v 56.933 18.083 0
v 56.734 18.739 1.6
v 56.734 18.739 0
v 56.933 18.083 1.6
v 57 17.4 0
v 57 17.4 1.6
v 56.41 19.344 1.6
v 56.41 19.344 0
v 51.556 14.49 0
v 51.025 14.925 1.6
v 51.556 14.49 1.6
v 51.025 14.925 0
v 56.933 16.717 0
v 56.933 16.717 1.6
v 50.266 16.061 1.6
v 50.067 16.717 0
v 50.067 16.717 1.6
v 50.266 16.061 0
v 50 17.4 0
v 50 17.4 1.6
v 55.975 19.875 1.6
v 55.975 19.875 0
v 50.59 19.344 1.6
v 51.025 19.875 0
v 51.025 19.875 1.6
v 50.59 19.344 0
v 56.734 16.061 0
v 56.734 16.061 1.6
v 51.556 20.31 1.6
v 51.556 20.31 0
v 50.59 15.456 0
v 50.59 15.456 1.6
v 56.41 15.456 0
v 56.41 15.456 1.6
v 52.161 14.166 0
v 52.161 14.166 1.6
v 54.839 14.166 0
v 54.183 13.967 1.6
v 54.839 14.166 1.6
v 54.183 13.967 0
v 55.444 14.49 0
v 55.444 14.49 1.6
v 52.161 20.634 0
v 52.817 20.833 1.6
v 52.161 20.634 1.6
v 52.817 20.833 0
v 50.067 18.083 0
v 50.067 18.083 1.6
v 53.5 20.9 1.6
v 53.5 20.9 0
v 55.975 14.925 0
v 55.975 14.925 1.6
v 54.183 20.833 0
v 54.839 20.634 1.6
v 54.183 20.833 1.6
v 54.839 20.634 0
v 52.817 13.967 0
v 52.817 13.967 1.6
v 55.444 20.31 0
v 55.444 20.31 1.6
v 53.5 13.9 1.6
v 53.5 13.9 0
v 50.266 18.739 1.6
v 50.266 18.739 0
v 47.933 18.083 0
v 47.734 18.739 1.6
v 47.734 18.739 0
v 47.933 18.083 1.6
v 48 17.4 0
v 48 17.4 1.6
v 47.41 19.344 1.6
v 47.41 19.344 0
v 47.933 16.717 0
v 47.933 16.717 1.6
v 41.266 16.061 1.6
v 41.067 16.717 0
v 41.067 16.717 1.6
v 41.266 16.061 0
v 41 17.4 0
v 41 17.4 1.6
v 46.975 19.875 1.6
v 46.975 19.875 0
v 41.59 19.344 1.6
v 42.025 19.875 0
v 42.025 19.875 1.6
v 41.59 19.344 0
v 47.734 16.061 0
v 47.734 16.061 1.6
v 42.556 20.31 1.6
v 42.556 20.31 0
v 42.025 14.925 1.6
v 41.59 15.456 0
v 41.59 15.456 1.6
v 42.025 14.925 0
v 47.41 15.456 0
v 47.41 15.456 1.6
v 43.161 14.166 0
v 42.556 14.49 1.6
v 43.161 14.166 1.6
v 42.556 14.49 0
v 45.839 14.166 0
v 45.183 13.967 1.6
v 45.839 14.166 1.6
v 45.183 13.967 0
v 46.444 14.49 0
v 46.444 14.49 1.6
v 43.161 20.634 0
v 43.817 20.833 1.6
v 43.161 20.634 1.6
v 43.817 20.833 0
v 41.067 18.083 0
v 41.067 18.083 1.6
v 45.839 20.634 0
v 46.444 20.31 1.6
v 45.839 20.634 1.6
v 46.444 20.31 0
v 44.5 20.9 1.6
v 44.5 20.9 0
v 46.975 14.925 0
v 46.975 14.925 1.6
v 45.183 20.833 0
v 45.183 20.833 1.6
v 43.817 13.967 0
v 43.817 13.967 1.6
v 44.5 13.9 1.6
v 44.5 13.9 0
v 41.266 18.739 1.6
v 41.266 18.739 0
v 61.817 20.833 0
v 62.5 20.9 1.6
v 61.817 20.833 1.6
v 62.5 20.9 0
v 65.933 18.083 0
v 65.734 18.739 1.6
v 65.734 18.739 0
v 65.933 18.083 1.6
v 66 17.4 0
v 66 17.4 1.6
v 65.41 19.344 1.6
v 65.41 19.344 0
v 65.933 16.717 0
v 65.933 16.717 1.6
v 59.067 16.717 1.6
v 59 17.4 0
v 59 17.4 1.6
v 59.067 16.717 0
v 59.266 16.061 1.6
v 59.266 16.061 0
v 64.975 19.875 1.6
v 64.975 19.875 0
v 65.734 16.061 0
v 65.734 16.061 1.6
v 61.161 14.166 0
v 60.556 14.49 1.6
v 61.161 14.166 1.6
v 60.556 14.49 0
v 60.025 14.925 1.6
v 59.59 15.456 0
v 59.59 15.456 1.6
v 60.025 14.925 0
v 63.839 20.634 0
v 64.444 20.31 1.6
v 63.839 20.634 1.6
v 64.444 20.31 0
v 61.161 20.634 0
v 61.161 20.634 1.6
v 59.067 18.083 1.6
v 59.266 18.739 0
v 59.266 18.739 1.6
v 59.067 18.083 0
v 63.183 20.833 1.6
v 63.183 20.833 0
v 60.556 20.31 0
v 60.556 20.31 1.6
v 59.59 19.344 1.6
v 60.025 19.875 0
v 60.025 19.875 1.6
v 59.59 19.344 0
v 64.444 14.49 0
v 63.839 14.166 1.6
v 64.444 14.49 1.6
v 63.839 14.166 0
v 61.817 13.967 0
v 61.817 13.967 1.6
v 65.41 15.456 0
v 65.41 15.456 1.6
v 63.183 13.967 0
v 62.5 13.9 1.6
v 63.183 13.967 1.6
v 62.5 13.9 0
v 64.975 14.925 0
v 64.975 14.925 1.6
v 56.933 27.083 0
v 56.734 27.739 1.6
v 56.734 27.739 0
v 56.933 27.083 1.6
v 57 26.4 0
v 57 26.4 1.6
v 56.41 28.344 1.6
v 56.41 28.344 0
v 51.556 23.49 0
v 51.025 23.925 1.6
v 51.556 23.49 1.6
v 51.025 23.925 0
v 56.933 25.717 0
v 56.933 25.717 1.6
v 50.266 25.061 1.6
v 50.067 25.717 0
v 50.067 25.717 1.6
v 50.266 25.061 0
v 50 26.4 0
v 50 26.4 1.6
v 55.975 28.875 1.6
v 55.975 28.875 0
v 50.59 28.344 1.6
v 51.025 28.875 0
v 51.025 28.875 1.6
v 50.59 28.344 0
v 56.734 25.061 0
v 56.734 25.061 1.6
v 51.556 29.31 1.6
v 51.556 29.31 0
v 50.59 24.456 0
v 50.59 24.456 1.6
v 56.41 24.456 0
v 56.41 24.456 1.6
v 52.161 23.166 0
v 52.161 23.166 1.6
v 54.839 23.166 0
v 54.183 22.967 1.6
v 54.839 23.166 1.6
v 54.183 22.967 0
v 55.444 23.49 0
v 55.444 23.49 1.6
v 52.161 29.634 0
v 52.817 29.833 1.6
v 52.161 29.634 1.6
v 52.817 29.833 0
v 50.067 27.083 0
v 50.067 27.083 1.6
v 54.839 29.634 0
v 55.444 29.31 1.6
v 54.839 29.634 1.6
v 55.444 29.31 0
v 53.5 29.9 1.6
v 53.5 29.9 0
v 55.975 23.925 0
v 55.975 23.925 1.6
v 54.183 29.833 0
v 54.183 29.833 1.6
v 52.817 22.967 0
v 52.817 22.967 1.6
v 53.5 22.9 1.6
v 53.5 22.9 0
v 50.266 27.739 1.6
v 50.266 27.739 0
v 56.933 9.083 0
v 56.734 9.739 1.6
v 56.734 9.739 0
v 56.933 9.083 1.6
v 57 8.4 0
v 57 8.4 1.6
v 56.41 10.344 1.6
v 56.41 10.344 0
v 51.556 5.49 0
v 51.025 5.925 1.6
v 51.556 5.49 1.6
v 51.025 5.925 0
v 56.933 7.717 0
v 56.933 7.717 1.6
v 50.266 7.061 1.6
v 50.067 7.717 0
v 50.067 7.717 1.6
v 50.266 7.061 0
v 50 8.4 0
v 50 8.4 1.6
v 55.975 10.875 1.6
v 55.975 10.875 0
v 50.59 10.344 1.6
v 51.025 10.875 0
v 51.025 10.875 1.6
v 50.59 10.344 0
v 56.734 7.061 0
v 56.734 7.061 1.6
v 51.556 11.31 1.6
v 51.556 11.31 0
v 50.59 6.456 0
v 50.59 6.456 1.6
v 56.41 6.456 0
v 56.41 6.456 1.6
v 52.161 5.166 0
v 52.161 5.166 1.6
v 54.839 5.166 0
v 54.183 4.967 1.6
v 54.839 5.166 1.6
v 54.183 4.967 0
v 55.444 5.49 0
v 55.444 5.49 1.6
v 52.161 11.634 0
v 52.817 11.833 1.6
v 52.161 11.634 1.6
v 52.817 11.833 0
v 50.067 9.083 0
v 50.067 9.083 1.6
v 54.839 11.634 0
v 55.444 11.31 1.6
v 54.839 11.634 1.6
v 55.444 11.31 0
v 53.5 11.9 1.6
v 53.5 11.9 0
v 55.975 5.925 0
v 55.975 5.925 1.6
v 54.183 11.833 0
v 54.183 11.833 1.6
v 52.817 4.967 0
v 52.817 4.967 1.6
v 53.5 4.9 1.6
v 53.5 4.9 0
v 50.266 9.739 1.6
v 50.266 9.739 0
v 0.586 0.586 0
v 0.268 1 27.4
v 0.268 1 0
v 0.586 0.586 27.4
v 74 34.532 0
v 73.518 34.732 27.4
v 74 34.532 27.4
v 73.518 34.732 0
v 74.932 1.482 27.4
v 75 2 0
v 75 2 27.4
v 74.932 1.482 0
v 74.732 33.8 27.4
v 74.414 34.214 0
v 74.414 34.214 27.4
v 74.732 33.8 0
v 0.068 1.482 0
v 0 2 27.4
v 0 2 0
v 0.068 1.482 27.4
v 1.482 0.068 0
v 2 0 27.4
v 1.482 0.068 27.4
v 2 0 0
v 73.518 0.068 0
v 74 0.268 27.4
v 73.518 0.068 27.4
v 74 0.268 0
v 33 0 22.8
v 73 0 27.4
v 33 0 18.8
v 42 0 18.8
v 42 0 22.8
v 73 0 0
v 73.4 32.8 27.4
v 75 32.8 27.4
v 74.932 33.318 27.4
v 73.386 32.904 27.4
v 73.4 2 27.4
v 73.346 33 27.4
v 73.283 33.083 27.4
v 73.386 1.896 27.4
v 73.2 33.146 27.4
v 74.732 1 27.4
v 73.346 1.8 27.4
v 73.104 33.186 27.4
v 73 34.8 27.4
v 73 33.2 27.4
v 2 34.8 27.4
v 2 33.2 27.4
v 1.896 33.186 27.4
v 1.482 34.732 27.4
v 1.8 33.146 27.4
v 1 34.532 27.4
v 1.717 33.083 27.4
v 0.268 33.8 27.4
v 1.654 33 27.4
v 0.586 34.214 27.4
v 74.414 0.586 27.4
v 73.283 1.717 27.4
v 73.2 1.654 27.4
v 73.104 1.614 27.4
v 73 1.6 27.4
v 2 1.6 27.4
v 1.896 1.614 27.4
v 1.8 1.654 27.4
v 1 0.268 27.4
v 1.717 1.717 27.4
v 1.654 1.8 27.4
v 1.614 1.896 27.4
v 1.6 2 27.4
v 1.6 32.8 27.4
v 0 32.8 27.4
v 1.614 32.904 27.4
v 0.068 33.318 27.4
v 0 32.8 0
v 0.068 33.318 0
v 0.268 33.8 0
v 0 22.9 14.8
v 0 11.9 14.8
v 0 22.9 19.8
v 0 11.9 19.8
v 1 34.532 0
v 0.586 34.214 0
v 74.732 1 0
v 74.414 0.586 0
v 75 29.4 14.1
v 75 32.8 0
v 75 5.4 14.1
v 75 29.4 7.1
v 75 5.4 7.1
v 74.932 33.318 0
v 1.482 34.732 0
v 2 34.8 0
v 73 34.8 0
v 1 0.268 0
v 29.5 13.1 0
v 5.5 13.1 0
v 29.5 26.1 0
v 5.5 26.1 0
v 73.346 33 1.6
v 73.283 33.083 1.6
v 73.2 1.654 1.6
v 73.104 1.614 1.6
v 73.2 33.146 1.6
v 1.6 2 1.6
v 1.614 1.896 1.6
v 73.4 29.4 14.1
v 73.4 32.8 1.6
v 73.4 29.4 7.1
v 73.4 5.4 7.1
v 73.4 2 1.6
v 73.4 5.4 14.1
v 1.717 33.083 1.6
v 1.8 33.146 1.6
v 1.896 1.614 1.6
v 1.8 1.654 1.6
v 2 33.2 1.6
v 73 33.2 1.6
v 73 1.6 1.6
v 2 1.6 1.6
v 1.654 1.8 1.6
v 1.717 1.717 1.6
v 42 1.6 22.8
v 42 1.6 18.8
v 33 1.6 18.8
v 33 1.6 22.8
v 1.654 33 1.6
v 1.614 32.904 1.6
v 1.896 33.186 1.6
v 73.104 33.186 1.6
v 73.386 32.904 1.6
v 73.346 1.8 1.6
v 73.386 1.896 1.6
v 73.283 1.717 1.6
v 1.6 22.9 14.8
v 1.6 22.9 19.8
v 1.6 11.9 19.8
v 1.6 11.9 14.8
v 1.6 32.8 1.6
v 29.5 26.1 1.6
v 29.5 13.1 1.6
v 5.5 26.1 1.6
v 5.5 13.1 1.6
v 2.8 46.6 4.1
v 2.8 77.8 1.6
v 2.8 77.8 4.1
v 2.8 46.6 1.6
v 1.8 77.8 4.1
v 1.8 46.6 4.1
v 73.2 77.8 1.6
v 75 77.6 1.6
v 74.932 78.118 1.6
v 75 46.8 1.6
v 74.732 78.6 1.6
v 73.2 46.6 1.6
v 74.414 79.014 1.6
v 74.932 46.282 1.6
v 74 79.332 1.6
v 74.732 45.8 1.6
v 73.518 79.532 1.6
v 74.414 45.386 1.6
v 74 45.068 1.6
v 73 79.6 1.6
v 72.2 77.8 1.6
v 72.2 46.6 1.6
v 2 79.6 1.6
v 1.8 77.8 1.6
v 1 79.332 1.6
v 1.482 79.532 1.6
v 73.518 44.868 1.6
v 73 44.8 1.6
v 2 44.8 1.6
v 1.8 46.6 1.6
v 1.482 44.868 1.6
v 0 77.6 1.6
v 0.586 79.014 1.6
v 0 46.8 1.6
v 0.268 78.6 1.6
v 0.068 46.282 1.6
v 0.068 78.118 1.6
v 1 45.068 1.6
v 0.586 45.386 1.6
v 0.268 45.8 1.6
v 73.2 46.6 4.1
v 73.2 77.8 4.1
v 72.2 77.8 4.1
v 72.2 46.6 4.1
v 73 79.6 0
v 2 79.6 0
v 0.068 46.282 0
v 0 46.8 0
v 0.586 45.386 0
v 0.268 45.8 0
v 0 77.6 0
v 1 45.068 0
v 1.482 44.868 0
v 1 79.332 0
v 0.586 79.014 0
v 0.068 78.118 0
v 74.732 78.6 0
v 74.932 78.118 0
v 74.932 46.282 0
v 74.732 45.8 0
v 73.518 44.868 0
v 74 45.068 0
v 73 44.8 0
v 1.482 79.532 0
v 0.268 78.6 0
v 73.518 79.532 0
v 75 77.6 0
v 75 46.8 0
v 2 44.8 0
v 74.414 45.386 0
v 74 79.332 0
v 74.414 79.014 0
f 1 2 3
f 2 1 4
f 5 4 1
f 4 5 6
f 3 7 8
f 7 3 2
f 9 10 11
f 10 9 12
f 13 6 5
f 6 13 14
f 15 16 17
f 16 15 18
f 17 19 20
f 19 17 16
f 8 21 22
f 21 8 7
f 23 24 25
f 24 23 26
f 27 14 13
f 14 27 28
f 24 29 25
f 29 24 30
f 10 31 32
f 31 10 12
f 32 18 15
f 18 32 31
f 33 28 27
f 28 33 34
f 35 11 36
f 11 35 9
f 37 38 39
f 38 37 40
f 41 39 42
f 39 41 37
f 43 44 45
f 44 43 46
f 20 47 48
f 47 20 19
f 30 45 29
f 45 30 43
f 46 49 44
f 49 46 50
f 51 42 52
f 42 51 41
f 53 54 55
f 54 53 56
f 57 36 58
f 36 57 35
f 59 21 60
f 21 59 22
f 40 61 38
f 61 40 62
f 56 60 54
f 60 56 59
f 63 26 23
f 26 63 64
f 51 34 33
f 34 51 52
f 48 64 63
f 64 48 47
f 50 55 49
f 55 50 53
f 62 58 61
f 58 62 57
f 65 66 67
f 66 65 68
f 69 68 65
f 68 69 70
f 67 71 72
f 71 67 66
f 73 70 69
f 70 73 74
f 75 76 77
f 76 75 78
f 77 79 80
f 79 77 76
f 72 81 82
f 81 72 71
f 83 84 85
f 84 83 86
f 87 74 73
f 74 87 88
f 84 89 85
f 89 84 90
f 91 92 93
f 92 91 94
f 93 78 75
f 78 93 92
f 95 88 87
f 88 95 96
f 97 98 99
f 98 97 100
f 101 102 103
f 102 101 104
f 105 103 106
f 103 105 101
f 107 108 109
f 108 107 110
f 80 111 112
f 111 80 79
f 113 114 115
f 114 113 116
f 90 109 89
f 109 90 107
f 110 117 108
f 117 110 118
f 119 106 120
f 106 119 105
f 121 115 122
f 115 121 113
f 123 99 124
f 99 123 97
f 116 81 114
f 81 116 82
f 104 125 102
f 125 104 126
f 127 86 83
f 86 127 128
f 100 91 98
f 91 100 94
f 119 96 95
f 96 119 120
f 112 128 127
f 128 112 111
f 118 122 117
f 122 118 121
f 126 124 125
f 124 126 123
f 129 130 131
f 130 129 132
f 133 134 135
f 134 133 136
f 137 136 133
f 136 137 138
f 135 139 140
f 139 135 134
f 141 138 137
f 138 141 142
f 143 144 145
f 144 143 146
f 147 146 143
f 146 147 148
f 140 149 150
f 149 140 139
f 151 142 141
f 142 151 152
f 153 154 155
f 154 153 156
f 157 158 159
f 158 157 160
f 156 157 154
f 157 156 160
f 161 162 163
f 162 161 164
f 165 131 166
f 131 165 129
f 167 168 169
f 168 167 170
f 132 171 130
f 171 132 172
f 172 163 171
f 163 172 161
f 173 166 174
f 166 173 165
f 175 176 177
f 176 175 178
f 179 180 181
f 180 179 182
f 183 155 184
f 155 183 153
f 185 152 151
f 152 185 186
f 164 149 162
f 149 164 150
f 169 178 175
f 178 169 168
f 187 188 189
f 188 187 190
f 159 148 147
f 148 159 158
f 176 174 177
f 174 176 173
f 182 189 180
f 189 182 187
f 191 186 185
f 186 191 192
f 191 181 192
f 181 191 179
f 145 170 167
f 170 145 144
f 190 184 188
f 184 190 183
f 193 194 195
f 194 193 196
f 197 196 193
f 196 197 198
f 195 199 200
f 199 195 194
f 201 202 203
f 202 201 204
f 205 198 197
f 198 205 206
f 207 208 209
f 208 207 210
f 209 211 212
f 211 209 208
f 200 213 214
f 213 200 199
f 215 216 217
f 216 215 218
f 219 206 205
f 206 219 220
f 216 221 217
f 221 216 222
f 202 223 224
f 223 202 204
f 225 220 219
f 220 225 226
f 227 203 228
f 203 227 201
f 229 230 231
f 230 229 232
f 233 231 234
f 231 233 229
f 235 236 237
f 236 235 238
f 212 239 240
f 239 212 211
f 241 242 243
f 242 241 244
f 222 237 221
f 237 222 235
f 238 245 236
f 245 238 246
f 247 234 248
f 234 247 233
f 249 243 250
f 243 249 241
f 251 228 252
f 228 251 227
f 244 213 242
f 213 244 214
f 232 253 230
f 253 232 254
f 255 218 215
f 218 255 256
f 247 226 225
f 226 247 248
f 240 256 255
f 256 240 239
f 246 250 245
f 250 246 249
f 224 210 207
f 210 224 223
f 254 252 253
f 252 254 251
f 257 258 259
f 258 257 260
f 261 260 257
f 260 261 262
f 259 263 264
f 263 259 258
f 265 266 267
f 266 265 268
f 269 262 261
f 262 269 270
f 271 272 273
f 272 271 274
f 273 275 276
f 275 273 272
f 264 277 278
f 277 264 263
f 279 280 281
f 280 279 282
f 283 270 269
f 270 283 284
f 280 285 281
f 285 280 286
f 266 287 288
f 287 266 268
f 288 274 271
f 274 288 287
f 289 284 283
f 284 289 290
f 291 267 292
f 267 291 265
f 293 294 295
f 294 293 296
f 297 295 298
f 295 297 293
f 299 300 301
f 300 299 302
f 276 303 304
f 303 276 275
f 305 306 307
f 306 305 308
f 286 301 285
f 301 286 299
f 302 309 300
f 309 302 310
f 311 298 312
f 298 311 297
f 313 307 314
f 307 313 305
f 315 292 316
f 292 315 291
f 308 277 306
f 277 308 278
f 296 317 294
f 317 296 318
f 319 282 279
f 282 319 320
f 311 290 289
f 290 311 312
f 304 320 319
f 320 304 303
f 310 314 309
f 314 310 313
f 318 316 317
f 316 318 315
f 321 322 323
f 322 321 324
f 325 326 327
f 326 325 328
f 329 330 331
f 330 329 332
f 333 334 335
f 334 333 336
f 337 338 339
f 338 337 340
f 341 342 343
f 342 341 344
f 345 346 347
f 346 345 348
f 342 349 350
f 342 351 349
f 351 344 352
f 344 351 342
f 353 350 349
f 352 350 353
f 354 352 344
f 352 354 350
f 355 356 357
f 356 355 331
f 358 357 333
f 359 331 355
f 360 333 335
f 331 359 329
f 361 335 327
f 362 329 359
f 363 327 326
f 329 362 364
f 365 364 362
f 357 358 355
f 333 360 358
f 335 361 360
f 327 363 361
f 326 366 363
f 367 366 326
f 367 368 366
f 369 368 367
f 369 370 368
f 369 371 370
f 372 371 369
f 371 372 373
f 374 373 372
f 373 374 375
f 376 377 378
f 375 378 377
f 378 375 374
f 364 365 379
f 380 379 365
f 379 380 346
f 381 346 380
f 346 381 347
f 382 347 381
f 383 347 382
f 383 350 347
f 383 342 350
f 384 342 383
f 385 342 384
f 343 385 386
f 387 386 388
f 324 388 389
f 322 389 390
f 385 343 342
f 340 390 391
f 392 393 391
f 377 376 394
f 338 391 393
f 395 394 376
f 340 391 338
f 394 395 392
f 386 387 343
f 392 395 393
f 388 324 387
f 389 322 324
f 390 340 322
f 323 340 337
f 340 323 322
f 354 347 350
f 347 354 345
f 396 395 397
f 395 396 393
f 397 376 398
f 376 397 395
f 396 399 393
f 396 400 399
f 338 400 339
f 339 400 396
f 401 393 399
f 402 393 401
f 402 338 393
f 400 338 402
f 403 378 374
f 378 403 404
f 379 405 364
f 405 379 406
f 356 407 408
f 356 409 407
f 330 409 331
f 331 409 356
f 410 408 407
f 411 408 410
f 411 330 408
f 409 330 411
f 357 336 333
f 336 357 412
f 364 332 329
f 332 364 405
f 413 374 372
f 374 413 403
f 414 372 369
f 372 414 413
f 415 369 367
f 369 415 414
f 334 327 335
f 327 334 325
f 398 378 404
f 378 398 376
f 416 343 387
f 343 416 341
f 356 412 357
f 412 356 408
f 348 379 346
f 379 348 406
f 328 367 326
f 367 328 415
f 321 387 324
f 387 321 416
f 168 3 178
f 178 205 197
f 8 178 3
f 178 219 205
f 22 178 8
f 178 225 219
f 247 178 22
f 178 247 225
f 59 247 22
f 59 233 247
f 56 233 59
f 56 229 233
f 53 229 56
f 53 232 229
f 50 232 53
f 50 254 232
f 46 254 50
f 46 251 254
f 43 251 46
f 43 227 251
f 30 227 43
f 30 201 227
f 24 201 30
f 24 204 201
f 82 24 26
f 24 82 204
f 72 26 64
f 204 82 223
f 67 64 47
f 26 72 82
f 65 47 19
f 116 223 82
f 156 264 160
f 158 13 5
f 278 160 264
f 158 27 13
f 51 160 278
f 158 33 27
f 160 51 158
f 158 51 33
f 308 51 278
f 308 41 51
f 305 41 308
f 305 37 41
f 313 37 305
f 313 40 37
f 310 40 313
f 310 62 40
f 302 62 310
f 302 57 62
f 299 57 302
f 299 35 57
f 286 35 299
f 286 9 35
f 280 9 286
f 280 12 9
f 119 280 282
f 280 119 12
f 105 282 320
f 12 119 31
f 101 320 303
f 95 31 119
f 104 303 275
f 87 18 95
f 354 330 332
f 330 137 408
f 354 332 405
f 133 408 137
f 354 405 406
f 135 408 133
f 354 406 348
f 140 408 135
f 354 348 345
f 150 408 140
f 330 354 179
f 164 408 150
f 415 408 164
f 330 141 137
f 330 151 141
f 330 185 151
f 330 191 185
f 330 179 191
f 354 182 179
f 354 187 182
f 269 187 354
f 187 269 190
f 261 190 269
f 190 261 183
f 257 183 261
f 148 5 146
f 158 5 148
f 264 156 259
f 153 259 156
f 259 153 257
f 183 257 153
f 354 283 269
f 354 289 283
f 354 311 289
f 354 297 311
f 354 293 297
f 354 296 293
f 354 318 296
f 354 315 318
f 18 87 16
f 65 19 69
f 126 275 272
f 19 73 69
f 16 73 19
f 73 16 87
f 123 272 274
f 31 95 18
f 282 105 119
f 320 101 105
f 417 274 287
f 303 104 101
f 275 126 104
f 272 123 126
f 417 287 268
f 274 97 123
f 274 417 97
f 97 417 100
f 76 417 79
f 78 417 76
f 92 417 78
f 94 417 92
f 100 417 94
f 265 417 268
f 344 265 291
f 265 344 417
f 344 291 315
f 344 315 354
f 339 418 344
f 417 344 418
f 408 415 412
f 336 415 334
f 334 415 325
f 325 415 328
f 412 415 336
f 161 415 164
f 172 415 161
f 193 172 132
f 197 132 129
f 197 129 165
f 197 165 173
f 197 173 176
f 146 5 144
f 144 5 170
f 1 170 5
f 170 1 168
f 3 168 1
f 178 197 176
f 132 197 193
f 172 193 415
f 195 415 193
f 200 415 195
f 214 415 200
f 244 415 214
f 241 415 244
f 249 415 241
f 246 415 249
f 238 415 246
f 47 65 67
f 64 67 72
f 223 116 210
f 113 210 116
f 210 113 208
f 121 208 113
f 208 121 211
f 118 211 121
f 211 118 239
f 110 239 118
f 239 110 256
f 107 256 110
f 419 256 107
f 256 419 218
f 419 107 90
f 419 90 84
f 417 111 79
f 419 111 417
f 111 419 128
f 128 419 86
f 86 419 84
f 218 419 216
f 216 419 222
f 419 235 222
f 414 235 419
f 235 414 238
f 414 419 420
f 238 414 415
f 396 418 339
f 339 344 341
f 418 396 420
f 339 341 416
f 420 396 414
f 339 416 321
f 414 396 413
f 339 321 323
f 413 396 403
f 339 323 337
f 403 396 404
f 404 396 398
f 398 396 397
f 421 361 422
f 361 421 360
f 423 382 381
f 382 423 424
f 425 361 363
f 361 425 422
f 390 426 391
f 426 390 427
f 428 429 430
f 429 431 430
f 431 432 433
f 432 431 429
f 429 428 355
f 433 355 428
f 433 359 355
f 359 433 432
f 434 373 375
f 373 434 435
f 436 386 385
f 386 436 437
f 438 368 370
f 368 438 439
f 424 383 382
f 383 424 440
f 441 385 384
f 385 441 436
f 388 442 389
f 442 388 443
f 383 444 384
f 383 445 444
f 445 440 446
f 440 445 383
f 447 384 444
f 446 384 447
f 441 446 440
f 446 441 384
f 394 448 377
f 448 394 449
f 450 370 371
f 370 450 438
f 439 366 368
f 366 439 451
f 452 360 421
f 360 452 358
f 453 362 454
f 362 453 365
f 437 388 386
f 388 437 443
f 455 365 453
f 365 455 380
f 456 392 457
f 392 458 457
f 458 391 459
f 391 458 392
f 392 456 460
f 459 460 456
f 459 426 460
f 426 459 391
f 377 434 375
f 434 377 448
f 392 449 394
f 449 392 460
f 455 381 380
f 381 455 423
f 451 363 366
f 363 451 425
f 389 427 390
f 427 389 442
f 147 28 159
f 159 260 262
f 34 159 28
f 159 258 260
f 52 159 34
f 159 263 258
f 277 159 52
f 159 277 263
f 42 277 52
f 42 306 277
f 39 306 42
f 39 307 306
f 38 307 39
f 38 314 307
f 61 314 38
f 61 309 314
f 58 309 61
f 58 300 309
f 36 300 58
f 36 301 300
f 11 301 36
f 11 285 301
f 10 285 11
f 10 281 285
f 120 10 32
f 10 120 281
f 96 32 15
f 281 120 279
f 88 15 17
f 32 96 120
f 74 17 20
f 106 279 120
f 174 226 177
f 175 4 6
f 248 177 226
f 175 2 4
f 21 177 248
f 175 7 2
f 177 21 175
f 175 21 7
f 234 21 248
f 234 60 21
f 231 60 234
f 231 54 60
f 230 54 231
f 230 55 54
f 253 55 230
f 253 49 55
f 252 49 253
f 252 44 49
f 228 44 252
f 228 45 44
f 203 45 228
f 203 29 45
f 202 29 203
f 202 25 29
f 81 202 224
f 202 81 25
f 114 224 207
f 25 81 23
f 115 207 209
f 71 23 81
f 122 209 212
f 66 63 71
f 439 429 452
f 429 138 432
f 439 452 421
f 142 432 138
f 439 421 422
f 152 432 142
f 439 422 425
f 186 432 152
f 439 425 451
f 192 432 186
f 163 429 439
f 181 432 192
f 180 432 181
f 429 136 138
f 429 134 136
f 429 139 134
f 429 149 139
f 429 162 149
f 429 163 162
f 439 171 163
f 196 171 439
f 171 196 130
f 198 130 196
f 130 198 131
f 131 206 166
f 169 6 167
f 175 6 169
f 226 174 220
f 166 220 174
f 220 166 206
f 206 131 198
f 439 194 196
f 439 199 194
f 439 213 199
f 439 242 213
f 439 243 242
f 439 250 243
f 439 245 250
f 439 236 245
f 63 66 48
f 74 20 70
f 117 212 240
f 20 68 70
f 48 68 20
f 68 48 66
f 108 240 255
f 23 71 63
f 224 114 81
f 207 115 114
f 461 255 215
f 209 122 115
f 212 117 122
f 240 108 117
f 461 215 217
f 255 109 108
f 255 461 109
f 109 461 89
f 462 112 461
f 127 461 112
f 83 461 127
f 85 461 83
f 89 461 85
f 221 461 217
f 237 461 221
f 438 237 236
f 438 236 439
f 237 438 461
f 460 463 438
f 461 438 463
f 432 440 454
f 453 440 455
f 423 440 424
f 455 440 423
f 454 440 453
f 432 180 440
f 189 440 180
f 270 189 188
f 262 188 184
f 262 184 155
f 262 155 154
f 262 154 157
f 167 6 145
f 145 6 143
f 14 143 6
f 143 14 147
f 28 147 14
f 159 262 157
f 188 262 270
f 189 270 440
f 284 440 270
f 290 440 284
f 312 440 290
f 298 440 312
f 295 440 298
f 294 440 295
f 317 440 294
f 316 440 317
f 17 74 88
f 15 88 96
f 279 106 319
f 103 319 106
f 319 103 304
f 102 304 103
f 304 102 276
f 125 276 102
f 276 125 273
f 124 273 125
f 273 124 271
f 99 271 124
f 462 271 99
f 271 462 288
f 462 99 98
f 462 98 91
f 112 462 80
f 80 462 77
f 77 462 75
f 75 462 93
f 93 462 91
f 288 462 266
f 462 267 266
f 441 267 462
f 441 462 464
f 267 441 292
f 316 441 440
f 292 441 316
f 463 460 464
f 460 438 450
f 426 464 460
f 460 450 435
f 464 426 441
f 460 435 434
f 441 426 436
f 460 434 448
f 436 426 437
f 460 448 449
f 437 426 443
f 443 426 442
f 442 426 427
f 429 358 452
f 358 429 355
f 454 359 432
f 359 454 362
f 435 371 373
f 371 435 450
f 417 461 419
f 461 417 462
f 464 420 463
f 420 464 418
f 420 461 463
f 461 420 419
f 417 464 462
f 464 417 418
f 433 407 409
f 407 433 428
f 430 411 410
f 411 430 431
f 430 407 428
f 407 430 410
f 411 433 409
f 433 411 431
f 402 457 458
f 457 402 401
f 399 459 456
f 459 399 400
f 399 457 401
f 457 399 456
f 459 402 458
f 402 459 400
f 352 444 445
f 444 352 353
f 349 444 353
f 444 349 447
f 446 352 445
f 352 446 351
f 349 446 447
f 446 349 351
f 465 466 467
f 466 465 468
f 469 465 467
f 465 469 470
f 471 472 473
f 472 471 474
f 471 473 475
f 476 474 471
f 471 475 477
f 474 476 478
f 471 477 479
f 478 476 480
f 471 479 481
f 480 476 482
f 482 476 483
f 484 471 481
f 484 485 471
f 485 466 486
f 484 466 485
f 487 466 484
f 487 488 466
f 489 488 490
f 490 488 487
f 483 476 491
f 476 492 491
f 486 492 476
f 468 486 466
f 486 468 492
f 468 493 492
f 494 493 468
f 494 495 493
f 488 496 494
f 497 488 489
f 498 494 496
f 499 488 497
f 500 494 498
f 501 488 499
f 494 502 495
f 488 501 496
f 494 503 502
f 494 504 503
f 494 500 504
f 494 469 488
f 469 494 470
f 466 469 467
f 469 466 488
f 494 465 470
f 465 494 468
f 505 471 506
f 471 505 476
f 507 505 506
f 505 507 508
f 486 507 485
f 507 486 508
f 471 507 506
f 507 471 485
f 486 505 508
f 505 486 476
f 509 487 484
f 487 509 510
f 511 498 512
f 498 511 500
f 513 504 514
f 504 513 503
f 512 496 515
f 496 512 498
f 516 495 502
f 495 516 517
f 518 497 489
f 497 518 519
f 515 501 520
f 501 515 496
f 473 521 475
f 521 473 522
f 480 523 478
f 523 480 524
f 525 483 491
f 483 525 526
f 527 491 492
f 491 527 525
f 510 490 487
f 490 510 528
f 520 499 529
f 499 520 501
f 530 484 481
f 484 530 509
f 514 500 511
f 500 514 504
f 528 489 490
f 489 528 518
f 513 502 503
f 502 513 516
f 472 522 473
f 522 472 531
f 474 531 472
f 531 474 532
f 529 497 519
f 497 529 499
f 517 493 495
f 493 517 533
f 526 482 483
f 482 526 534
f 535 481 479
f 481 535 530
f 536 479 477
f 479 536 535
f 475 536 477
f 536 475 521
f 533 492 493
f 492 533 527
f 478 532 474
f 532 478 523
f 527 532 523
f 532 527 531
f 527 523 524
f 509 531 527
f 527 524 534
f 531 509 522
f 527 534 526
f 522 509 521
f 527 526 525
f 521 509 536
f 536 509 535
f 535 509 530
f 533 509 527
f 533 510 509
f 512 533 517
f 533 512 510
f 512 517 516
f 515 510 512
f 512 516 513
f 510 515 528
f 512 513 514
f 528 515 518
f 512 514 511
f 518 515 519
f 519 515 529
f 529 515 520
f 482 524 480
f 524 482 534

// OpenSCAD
// =====================================================================
//  POCKET AI CASE (parametrik) - untuk 3D print
//  Buka di OpenSCAD (gratis), ubah angka di bawah sesuai komponenmu,
//  tekan F6 (Render), lalu File > Export > Export as STL.
//
//  Susunan dari depan ke belakang:
//    [pelat depan: jendela OLED + 5 tombol]
//    [lapisan OLED]
//    [lapisan ESP32-S3]
//    [lapisan belakang: charger (kiri), baterai (kanan),
//     boost MT3608 ditumpuk di atas baterai]
//    [tutup belakang, tekan masuk]
//
//  Cetak: body dengan sisi depan di bawah, lid dengan pelat di bawah.
//  Layar menghadap depan di sisi z = 0.
// =====================================================================

part = "both";   // "body", "lid", atau "both" (both = untuk pratinjau)

// ---------- UKURAN KOMPONEN (mm) - UKUR PUNYAMU ----------
esp_l  = 69;     // panjang board ESP32-S3
esp_w  = 26;     // lebar board
esp_h  = 8;      // tebal board + komponen (tanpa pin header = sekitar 6-8)

oled_l = 29;     // modul OLED, sisi sejajar panjang casing
oled_w = 27.4;   // modul OLED, sisi sejajar lebar casing (pin header di sisi atas)
oled_h = 5;      // tebal OLED + solder kabel

bat_l  = 40;     // baterai LiPo (kode 603040 = tebal 6, lebar 30, panjang 40)
bat_w  = 30;
bat_t  = 6;

chg_l  = 28;     // modul charger (TP4056 sekitar 26 x 17)
chg_w  = 17;
chg_h  = 5;

boost_l = 37;    // modul boost MT3608 (sekitar 37 x 17), ditempel di atas baterai
boost_w = 17;
boost_h = 6;     // tebal modul + induktor

// ---------- JENDELA LAYAR ----------
win_w        = 24;   // lebar jendela
win_h        = 13;   // tinggi jendela
win_from_top = 5;    // jarak tepi atas PCB OLED ke tepi atas jendela

// ---------- TOMBOL ----------
btn_d     = 7;       // diameter lubang tombol
btn_pitch = 9;       // jarak antar pusat tombol (pola plus)

// ---------- LUBANG SAMPING ----------
usb_esp_w = 24;      // lebar lubang USB ESP32 (dua port)
usb_h     = 7;       // tinggi lubang USB ESP32
usb_chg_w = 11;      // lebar lubang USB charger
sw_w      = 9;       // lebar lubang saklar
sw_h      = 4;       // tinggi lubang saklar

// ---------- CANGKANG ----------
wall    = 1.6;       // tebal dinding
t_front = 1.6;       // tebal pelat depan
t_lid   = 1.6;       // tebal tutup
gap     = 0.8;       // jarak longgar sisi lebar
end_gap = 1.4;       // jarak longgar sisi panjang (tempat lip tutup)
tol     = 0.2;       // toleransi tutup
lip_t   = 1.0;       // tebal lip tutup
lip_d   = 2.5;       // kedalaman lip tutup
r       = 2;         // radius sudut luar

// ---------- HITUNGAN OTOMATIS ----------
IL = max(esp_l, bat_l + chg_l + 1) + 2 * end_gap;   // panjang dalam
IW = max(esp_w, max(bat_w, oled_w)) + 2 * gap;      // lebar dalam
layer_back = max(bat_t + boost_h, chg_h);
assert(boost_l <= bat_l && boost_w <= bat_w, "Boost tidak muat di atas baterai, perbesar casing");
IH = oled_h + esp_h + layer_back + 0.8;             // tinggi dalam
OL = IL + 2 * wall;
OW = IW + 2 * wall;
OH = t_front + IH;

z_esp0  = t_front + oled_h;
z_back0 = z_esp0 + esp_h;

oled_x0   = wall + end_gap;               // sisi kiri PCB OLED
pcb_top_y = OW / 2 + oled_w / 2;          // sisi atas PCB OLED (pin header di sini)
zone_x0   = oled_x0 + oled_l + 3;
zone_x1   = wall + IL - end_gap;
bx        = (zone_x0 + zone_x1) / 2;      // pusat pola tombol
by        = OW / 2;

echo("Ukuran luar (panjang x lebar x tebal) mm:", OL, OW, OH + t_lid);

module rbox(l, w, h, rad) {
  hull() for (x = [rad, l - rad], y = [rad, w - rad])
    translate([x, y, 0]) cylinder(r = rad, h = h, $fn = 24);
}

module body() {
  difference() {
    rbox(OL, OW, OH, r);

    // rongga (terbuka ke belakang)
    translate([wall, wall, t_front])
      rbox(IL, IW, IH + 1, 0.4);

    // jendela OLED
    translate([oled_x0 + oled_l / 2 - win_w / 2,
               pcb_top_y - win_from_top - win_h,
               -0.1])
      cube([win_w, win_h, t_front + 0.2]);

    // 5 tombol (pola plus): tengah=OK, kiri=MUNDUR, kanan=MAJU, atas=HAPUS, bawah=KIRIM
    for (p = [[0, 0], [-1, 0], [1, 0], [0, 1], [0, -1]])
      translate([bx + p[0] * btn_pitch, by + p[1] * btn_pitch, -0.1])
        cylinder(d = btn_d, h = t_front + 0.2, $fn = 32);

    // lubang USB ESP32 (dinding kanan)
    translate([OL - wall - 0.1, OW / 2 - usb_esp_w / 2, z_esp0 + (esp_h - usb_h) / 2])
      cube([wall + 0.2, usb_esp_w, usb_h]);

    // lubang USB charger (dinding kiri, charger di kiri supaya
    // ujung antena ESP32 jauh dari baterai)
    translate([-0.1, OW / 2 - usb_chg_w / 2, z_back0 + 0.2])
      cube([wall + 0.2, usb_chg_w, min(layer_back, 5)]);

    // lubang saklar (dinding samping bawah)
    translate([OL / 2 - sw_w / 2, -0.1, z_back0 + (layer_back - sw_h) / 2 + 0.2])
      cube([sw_w, wall + 0.2, sw_h]);
  }
}

module lid() {
  rbox(OL, OW, t_lid, r);
  for (x = [wall + tol, wall + IL - tol - lip_t])
    translate([x, wall + tol, t_lid])
      cube([lip_t, IW - 2 * tol, lip_d]);
}

if (part == "body") body();
else if (part == "lid") lid();
else {
  body();
  translate([0, OW + 10, 0]) lid();
}
